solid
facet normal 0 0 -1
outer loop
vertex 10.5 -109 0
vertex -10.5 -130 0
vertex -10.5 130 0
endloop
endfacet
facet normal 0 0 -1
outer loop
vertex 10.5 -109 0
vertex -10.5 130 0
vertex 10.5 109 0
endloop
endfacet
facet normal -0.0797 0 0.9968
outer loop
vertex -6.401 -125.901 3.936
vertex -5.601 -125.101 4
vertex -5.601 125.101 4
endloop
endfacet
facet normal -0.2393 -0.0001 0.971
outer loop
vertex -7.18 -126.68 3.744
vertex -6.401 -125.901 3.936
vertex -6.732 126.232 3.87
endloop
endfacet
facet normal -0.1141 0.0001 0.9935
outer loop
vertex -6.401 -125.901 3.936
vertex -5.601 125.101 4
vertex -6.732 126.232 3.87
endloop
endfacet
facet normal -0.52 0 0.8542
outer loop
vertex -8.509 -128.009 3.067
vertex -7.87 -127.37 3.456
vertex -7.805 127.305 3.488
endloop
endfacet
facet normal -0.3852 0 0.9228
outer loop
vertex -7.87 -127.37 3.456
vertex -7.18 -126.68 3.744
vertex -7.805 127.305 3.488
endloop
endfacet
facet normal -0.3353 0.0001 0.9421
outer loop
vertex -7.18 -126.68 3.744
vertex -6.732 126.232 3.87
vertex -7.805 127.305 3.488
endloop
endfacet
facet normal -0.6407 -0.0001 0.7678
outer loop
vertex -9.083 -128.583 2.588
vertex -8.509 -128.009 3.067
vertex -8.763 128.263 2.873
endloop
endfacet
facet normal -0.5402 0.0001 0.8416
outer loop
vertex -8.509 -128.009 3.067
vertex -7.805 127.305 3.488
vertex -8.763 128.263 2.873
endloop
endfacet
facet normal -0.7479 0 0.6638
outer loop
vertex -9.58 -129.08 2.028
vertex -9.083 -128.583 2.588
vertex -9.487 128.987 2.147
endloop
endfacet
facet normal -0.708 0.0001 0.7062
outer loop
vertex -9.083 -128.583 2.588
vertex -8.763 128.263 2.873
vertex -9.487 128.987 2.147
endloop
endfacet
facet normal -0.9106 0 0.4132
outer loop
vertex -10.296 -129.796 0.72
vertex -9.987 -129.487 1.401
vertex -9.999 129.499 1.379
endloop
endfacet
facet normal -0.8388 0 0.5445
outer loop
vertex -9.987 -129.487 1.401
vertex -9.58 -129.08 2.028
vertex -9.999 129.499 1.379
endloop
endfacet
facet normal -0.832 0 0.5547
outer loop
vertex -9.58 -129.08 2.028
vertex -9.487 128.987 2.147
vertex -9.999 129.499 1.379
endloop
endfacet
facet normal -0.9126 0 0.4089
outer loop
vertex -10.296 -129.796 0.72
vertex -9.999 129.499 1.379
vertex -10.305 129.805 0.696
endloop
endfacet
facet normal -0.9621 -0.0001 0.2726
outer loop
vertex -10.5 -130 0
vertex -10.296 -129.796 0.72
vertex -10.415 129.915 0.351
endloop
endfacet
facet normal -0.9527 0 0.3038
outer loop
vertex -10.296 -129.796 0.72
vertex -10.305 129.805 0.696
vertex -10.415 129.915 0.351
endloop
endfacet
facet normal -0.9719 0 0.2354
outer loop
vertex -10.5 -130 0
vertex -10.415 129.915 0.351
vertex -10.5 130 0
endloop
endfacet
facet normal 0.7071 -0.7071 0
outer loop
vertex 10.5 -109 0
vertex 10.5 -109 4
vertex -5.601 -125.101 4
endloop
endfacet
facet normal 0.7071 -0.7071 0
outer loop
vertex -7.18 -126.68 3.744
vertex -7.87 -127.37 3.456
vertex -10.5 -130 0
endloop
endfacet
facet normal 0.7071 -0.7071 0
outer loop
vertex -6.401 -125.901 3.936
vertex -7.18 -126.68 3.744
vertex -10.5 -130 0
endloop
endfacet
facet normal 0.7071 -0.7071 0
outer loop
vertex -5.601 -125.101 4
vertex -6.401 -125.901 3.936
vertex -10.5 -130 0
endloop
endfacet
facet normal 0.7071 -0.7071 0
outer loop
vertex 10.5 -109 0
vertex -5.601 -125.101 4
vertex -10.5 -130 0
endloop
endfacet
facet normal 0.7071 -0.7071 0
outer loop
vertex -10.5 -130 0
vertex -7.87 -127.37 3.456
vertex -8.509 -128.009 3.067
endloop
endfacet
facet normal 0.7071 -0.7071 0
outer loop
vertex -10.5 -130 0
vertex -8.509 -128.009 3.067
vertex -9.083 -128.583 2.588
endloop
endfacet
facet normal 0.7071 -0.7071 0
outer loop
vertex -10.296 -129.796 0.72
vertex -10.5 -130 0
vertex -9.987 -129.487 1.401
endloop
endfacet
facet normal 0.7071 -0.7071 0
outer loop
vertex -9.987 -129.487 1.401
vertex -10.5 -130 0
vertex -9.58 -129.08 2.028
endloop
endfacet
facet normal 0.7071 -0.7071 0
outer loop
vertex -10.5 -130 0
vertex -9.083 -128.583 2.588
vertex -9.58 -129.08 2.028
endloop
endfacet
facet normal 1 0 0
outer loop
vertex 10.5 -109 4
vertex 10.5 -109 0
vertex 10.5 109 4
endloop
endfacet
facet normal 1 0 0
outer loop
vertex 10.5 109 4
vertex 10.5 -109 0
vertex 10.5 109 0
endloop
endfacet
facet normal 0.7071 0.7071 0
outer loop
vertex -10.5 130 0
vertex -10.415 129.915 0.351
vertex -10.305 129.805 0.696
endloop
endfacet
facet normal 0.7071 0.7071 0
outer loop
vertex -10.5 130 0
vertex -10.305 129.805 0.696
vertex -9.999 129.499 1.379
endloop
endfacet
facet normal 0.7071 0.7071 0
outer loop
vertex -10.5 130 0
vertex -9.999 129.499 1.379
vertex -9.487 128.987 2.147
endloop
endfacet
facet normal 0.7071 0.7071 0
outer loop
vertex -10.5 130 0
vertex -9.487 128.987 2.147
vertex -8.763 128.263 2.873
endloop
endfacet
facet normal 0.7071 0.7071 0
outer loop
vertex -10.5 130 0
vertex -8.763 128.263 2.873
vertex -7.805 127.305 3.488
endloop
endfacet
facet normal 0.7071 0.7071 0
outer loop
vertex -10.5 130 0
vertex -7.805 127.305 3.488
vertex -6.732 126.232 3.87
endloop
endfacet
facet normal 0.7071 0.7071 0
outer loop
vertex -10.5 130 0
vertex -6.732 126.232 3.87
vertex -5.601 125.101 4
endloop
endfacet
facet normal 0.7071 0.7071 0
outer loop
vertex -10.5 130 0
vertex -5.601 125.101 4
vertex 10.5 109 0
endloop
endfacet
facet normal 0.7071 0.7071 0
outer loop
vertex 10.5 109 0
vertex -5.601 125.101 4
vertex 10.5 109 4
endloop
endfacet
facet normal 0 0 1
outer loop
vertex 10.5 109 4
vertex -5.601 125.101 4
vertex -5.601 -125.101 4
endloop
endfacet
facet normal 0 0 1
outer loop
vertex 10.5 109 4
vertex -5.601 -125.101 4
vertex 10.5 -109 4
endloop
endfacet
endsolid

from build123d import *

# Parameters (mm, degrees)
F0_W        = 21
F0_H        = 260
F1_DEPTH    = 4
F3_DEPTH    = 4.001
F4_T1_DEPTH = 284.4948974279


# Not quite as in the source:
# - a fillet or chamfer that OpenCascade refuses, or shapes differently, is made with other operations: its cross-section is extruded or revolved along the edge and cut away or added


with BuildPart() as f1:
    # F0 (on Top) → F1 (new body)
    with BuildSketch(Plane.XY):
        Rectangle(F0_W, F0_H)
    extrude(amount=F1_DEPTH)

    # F2 (on face) → F3 (cut, through all)
    with BuildSketch(Plane.XY.offset(4)):
        Polygon((10.5, 130), (-10.5, 130), (10.5, 109), align=None)
        Polygon((10.5, -109), (-10.5, -130), (10.5, -130), align=None)
    extrude(amount=-F3_DEPTH, mode=Mode.SUBTRACT)

    # F4: fillet of radius 5 on 1 edges, made by hand

    # F4_s2 → F4_t1 (cut)
    with BuildSketch(Plane.XZ.offset(-142.2474487139)):
        with BuildLine():
            ThreePointArc((-5.6010205144, 4), (-8.7632981746, 2.8729833462), (-10.5, 0))
            Line((-10.5, 0), (-10.5, 4))
            Line((-10.5, 4), (-5.6010205144, 4))
        make_face()
    extrude(amount=F4_T1_DEPTH, mode=Mode.SUBTRACT)


solid = f1.part
